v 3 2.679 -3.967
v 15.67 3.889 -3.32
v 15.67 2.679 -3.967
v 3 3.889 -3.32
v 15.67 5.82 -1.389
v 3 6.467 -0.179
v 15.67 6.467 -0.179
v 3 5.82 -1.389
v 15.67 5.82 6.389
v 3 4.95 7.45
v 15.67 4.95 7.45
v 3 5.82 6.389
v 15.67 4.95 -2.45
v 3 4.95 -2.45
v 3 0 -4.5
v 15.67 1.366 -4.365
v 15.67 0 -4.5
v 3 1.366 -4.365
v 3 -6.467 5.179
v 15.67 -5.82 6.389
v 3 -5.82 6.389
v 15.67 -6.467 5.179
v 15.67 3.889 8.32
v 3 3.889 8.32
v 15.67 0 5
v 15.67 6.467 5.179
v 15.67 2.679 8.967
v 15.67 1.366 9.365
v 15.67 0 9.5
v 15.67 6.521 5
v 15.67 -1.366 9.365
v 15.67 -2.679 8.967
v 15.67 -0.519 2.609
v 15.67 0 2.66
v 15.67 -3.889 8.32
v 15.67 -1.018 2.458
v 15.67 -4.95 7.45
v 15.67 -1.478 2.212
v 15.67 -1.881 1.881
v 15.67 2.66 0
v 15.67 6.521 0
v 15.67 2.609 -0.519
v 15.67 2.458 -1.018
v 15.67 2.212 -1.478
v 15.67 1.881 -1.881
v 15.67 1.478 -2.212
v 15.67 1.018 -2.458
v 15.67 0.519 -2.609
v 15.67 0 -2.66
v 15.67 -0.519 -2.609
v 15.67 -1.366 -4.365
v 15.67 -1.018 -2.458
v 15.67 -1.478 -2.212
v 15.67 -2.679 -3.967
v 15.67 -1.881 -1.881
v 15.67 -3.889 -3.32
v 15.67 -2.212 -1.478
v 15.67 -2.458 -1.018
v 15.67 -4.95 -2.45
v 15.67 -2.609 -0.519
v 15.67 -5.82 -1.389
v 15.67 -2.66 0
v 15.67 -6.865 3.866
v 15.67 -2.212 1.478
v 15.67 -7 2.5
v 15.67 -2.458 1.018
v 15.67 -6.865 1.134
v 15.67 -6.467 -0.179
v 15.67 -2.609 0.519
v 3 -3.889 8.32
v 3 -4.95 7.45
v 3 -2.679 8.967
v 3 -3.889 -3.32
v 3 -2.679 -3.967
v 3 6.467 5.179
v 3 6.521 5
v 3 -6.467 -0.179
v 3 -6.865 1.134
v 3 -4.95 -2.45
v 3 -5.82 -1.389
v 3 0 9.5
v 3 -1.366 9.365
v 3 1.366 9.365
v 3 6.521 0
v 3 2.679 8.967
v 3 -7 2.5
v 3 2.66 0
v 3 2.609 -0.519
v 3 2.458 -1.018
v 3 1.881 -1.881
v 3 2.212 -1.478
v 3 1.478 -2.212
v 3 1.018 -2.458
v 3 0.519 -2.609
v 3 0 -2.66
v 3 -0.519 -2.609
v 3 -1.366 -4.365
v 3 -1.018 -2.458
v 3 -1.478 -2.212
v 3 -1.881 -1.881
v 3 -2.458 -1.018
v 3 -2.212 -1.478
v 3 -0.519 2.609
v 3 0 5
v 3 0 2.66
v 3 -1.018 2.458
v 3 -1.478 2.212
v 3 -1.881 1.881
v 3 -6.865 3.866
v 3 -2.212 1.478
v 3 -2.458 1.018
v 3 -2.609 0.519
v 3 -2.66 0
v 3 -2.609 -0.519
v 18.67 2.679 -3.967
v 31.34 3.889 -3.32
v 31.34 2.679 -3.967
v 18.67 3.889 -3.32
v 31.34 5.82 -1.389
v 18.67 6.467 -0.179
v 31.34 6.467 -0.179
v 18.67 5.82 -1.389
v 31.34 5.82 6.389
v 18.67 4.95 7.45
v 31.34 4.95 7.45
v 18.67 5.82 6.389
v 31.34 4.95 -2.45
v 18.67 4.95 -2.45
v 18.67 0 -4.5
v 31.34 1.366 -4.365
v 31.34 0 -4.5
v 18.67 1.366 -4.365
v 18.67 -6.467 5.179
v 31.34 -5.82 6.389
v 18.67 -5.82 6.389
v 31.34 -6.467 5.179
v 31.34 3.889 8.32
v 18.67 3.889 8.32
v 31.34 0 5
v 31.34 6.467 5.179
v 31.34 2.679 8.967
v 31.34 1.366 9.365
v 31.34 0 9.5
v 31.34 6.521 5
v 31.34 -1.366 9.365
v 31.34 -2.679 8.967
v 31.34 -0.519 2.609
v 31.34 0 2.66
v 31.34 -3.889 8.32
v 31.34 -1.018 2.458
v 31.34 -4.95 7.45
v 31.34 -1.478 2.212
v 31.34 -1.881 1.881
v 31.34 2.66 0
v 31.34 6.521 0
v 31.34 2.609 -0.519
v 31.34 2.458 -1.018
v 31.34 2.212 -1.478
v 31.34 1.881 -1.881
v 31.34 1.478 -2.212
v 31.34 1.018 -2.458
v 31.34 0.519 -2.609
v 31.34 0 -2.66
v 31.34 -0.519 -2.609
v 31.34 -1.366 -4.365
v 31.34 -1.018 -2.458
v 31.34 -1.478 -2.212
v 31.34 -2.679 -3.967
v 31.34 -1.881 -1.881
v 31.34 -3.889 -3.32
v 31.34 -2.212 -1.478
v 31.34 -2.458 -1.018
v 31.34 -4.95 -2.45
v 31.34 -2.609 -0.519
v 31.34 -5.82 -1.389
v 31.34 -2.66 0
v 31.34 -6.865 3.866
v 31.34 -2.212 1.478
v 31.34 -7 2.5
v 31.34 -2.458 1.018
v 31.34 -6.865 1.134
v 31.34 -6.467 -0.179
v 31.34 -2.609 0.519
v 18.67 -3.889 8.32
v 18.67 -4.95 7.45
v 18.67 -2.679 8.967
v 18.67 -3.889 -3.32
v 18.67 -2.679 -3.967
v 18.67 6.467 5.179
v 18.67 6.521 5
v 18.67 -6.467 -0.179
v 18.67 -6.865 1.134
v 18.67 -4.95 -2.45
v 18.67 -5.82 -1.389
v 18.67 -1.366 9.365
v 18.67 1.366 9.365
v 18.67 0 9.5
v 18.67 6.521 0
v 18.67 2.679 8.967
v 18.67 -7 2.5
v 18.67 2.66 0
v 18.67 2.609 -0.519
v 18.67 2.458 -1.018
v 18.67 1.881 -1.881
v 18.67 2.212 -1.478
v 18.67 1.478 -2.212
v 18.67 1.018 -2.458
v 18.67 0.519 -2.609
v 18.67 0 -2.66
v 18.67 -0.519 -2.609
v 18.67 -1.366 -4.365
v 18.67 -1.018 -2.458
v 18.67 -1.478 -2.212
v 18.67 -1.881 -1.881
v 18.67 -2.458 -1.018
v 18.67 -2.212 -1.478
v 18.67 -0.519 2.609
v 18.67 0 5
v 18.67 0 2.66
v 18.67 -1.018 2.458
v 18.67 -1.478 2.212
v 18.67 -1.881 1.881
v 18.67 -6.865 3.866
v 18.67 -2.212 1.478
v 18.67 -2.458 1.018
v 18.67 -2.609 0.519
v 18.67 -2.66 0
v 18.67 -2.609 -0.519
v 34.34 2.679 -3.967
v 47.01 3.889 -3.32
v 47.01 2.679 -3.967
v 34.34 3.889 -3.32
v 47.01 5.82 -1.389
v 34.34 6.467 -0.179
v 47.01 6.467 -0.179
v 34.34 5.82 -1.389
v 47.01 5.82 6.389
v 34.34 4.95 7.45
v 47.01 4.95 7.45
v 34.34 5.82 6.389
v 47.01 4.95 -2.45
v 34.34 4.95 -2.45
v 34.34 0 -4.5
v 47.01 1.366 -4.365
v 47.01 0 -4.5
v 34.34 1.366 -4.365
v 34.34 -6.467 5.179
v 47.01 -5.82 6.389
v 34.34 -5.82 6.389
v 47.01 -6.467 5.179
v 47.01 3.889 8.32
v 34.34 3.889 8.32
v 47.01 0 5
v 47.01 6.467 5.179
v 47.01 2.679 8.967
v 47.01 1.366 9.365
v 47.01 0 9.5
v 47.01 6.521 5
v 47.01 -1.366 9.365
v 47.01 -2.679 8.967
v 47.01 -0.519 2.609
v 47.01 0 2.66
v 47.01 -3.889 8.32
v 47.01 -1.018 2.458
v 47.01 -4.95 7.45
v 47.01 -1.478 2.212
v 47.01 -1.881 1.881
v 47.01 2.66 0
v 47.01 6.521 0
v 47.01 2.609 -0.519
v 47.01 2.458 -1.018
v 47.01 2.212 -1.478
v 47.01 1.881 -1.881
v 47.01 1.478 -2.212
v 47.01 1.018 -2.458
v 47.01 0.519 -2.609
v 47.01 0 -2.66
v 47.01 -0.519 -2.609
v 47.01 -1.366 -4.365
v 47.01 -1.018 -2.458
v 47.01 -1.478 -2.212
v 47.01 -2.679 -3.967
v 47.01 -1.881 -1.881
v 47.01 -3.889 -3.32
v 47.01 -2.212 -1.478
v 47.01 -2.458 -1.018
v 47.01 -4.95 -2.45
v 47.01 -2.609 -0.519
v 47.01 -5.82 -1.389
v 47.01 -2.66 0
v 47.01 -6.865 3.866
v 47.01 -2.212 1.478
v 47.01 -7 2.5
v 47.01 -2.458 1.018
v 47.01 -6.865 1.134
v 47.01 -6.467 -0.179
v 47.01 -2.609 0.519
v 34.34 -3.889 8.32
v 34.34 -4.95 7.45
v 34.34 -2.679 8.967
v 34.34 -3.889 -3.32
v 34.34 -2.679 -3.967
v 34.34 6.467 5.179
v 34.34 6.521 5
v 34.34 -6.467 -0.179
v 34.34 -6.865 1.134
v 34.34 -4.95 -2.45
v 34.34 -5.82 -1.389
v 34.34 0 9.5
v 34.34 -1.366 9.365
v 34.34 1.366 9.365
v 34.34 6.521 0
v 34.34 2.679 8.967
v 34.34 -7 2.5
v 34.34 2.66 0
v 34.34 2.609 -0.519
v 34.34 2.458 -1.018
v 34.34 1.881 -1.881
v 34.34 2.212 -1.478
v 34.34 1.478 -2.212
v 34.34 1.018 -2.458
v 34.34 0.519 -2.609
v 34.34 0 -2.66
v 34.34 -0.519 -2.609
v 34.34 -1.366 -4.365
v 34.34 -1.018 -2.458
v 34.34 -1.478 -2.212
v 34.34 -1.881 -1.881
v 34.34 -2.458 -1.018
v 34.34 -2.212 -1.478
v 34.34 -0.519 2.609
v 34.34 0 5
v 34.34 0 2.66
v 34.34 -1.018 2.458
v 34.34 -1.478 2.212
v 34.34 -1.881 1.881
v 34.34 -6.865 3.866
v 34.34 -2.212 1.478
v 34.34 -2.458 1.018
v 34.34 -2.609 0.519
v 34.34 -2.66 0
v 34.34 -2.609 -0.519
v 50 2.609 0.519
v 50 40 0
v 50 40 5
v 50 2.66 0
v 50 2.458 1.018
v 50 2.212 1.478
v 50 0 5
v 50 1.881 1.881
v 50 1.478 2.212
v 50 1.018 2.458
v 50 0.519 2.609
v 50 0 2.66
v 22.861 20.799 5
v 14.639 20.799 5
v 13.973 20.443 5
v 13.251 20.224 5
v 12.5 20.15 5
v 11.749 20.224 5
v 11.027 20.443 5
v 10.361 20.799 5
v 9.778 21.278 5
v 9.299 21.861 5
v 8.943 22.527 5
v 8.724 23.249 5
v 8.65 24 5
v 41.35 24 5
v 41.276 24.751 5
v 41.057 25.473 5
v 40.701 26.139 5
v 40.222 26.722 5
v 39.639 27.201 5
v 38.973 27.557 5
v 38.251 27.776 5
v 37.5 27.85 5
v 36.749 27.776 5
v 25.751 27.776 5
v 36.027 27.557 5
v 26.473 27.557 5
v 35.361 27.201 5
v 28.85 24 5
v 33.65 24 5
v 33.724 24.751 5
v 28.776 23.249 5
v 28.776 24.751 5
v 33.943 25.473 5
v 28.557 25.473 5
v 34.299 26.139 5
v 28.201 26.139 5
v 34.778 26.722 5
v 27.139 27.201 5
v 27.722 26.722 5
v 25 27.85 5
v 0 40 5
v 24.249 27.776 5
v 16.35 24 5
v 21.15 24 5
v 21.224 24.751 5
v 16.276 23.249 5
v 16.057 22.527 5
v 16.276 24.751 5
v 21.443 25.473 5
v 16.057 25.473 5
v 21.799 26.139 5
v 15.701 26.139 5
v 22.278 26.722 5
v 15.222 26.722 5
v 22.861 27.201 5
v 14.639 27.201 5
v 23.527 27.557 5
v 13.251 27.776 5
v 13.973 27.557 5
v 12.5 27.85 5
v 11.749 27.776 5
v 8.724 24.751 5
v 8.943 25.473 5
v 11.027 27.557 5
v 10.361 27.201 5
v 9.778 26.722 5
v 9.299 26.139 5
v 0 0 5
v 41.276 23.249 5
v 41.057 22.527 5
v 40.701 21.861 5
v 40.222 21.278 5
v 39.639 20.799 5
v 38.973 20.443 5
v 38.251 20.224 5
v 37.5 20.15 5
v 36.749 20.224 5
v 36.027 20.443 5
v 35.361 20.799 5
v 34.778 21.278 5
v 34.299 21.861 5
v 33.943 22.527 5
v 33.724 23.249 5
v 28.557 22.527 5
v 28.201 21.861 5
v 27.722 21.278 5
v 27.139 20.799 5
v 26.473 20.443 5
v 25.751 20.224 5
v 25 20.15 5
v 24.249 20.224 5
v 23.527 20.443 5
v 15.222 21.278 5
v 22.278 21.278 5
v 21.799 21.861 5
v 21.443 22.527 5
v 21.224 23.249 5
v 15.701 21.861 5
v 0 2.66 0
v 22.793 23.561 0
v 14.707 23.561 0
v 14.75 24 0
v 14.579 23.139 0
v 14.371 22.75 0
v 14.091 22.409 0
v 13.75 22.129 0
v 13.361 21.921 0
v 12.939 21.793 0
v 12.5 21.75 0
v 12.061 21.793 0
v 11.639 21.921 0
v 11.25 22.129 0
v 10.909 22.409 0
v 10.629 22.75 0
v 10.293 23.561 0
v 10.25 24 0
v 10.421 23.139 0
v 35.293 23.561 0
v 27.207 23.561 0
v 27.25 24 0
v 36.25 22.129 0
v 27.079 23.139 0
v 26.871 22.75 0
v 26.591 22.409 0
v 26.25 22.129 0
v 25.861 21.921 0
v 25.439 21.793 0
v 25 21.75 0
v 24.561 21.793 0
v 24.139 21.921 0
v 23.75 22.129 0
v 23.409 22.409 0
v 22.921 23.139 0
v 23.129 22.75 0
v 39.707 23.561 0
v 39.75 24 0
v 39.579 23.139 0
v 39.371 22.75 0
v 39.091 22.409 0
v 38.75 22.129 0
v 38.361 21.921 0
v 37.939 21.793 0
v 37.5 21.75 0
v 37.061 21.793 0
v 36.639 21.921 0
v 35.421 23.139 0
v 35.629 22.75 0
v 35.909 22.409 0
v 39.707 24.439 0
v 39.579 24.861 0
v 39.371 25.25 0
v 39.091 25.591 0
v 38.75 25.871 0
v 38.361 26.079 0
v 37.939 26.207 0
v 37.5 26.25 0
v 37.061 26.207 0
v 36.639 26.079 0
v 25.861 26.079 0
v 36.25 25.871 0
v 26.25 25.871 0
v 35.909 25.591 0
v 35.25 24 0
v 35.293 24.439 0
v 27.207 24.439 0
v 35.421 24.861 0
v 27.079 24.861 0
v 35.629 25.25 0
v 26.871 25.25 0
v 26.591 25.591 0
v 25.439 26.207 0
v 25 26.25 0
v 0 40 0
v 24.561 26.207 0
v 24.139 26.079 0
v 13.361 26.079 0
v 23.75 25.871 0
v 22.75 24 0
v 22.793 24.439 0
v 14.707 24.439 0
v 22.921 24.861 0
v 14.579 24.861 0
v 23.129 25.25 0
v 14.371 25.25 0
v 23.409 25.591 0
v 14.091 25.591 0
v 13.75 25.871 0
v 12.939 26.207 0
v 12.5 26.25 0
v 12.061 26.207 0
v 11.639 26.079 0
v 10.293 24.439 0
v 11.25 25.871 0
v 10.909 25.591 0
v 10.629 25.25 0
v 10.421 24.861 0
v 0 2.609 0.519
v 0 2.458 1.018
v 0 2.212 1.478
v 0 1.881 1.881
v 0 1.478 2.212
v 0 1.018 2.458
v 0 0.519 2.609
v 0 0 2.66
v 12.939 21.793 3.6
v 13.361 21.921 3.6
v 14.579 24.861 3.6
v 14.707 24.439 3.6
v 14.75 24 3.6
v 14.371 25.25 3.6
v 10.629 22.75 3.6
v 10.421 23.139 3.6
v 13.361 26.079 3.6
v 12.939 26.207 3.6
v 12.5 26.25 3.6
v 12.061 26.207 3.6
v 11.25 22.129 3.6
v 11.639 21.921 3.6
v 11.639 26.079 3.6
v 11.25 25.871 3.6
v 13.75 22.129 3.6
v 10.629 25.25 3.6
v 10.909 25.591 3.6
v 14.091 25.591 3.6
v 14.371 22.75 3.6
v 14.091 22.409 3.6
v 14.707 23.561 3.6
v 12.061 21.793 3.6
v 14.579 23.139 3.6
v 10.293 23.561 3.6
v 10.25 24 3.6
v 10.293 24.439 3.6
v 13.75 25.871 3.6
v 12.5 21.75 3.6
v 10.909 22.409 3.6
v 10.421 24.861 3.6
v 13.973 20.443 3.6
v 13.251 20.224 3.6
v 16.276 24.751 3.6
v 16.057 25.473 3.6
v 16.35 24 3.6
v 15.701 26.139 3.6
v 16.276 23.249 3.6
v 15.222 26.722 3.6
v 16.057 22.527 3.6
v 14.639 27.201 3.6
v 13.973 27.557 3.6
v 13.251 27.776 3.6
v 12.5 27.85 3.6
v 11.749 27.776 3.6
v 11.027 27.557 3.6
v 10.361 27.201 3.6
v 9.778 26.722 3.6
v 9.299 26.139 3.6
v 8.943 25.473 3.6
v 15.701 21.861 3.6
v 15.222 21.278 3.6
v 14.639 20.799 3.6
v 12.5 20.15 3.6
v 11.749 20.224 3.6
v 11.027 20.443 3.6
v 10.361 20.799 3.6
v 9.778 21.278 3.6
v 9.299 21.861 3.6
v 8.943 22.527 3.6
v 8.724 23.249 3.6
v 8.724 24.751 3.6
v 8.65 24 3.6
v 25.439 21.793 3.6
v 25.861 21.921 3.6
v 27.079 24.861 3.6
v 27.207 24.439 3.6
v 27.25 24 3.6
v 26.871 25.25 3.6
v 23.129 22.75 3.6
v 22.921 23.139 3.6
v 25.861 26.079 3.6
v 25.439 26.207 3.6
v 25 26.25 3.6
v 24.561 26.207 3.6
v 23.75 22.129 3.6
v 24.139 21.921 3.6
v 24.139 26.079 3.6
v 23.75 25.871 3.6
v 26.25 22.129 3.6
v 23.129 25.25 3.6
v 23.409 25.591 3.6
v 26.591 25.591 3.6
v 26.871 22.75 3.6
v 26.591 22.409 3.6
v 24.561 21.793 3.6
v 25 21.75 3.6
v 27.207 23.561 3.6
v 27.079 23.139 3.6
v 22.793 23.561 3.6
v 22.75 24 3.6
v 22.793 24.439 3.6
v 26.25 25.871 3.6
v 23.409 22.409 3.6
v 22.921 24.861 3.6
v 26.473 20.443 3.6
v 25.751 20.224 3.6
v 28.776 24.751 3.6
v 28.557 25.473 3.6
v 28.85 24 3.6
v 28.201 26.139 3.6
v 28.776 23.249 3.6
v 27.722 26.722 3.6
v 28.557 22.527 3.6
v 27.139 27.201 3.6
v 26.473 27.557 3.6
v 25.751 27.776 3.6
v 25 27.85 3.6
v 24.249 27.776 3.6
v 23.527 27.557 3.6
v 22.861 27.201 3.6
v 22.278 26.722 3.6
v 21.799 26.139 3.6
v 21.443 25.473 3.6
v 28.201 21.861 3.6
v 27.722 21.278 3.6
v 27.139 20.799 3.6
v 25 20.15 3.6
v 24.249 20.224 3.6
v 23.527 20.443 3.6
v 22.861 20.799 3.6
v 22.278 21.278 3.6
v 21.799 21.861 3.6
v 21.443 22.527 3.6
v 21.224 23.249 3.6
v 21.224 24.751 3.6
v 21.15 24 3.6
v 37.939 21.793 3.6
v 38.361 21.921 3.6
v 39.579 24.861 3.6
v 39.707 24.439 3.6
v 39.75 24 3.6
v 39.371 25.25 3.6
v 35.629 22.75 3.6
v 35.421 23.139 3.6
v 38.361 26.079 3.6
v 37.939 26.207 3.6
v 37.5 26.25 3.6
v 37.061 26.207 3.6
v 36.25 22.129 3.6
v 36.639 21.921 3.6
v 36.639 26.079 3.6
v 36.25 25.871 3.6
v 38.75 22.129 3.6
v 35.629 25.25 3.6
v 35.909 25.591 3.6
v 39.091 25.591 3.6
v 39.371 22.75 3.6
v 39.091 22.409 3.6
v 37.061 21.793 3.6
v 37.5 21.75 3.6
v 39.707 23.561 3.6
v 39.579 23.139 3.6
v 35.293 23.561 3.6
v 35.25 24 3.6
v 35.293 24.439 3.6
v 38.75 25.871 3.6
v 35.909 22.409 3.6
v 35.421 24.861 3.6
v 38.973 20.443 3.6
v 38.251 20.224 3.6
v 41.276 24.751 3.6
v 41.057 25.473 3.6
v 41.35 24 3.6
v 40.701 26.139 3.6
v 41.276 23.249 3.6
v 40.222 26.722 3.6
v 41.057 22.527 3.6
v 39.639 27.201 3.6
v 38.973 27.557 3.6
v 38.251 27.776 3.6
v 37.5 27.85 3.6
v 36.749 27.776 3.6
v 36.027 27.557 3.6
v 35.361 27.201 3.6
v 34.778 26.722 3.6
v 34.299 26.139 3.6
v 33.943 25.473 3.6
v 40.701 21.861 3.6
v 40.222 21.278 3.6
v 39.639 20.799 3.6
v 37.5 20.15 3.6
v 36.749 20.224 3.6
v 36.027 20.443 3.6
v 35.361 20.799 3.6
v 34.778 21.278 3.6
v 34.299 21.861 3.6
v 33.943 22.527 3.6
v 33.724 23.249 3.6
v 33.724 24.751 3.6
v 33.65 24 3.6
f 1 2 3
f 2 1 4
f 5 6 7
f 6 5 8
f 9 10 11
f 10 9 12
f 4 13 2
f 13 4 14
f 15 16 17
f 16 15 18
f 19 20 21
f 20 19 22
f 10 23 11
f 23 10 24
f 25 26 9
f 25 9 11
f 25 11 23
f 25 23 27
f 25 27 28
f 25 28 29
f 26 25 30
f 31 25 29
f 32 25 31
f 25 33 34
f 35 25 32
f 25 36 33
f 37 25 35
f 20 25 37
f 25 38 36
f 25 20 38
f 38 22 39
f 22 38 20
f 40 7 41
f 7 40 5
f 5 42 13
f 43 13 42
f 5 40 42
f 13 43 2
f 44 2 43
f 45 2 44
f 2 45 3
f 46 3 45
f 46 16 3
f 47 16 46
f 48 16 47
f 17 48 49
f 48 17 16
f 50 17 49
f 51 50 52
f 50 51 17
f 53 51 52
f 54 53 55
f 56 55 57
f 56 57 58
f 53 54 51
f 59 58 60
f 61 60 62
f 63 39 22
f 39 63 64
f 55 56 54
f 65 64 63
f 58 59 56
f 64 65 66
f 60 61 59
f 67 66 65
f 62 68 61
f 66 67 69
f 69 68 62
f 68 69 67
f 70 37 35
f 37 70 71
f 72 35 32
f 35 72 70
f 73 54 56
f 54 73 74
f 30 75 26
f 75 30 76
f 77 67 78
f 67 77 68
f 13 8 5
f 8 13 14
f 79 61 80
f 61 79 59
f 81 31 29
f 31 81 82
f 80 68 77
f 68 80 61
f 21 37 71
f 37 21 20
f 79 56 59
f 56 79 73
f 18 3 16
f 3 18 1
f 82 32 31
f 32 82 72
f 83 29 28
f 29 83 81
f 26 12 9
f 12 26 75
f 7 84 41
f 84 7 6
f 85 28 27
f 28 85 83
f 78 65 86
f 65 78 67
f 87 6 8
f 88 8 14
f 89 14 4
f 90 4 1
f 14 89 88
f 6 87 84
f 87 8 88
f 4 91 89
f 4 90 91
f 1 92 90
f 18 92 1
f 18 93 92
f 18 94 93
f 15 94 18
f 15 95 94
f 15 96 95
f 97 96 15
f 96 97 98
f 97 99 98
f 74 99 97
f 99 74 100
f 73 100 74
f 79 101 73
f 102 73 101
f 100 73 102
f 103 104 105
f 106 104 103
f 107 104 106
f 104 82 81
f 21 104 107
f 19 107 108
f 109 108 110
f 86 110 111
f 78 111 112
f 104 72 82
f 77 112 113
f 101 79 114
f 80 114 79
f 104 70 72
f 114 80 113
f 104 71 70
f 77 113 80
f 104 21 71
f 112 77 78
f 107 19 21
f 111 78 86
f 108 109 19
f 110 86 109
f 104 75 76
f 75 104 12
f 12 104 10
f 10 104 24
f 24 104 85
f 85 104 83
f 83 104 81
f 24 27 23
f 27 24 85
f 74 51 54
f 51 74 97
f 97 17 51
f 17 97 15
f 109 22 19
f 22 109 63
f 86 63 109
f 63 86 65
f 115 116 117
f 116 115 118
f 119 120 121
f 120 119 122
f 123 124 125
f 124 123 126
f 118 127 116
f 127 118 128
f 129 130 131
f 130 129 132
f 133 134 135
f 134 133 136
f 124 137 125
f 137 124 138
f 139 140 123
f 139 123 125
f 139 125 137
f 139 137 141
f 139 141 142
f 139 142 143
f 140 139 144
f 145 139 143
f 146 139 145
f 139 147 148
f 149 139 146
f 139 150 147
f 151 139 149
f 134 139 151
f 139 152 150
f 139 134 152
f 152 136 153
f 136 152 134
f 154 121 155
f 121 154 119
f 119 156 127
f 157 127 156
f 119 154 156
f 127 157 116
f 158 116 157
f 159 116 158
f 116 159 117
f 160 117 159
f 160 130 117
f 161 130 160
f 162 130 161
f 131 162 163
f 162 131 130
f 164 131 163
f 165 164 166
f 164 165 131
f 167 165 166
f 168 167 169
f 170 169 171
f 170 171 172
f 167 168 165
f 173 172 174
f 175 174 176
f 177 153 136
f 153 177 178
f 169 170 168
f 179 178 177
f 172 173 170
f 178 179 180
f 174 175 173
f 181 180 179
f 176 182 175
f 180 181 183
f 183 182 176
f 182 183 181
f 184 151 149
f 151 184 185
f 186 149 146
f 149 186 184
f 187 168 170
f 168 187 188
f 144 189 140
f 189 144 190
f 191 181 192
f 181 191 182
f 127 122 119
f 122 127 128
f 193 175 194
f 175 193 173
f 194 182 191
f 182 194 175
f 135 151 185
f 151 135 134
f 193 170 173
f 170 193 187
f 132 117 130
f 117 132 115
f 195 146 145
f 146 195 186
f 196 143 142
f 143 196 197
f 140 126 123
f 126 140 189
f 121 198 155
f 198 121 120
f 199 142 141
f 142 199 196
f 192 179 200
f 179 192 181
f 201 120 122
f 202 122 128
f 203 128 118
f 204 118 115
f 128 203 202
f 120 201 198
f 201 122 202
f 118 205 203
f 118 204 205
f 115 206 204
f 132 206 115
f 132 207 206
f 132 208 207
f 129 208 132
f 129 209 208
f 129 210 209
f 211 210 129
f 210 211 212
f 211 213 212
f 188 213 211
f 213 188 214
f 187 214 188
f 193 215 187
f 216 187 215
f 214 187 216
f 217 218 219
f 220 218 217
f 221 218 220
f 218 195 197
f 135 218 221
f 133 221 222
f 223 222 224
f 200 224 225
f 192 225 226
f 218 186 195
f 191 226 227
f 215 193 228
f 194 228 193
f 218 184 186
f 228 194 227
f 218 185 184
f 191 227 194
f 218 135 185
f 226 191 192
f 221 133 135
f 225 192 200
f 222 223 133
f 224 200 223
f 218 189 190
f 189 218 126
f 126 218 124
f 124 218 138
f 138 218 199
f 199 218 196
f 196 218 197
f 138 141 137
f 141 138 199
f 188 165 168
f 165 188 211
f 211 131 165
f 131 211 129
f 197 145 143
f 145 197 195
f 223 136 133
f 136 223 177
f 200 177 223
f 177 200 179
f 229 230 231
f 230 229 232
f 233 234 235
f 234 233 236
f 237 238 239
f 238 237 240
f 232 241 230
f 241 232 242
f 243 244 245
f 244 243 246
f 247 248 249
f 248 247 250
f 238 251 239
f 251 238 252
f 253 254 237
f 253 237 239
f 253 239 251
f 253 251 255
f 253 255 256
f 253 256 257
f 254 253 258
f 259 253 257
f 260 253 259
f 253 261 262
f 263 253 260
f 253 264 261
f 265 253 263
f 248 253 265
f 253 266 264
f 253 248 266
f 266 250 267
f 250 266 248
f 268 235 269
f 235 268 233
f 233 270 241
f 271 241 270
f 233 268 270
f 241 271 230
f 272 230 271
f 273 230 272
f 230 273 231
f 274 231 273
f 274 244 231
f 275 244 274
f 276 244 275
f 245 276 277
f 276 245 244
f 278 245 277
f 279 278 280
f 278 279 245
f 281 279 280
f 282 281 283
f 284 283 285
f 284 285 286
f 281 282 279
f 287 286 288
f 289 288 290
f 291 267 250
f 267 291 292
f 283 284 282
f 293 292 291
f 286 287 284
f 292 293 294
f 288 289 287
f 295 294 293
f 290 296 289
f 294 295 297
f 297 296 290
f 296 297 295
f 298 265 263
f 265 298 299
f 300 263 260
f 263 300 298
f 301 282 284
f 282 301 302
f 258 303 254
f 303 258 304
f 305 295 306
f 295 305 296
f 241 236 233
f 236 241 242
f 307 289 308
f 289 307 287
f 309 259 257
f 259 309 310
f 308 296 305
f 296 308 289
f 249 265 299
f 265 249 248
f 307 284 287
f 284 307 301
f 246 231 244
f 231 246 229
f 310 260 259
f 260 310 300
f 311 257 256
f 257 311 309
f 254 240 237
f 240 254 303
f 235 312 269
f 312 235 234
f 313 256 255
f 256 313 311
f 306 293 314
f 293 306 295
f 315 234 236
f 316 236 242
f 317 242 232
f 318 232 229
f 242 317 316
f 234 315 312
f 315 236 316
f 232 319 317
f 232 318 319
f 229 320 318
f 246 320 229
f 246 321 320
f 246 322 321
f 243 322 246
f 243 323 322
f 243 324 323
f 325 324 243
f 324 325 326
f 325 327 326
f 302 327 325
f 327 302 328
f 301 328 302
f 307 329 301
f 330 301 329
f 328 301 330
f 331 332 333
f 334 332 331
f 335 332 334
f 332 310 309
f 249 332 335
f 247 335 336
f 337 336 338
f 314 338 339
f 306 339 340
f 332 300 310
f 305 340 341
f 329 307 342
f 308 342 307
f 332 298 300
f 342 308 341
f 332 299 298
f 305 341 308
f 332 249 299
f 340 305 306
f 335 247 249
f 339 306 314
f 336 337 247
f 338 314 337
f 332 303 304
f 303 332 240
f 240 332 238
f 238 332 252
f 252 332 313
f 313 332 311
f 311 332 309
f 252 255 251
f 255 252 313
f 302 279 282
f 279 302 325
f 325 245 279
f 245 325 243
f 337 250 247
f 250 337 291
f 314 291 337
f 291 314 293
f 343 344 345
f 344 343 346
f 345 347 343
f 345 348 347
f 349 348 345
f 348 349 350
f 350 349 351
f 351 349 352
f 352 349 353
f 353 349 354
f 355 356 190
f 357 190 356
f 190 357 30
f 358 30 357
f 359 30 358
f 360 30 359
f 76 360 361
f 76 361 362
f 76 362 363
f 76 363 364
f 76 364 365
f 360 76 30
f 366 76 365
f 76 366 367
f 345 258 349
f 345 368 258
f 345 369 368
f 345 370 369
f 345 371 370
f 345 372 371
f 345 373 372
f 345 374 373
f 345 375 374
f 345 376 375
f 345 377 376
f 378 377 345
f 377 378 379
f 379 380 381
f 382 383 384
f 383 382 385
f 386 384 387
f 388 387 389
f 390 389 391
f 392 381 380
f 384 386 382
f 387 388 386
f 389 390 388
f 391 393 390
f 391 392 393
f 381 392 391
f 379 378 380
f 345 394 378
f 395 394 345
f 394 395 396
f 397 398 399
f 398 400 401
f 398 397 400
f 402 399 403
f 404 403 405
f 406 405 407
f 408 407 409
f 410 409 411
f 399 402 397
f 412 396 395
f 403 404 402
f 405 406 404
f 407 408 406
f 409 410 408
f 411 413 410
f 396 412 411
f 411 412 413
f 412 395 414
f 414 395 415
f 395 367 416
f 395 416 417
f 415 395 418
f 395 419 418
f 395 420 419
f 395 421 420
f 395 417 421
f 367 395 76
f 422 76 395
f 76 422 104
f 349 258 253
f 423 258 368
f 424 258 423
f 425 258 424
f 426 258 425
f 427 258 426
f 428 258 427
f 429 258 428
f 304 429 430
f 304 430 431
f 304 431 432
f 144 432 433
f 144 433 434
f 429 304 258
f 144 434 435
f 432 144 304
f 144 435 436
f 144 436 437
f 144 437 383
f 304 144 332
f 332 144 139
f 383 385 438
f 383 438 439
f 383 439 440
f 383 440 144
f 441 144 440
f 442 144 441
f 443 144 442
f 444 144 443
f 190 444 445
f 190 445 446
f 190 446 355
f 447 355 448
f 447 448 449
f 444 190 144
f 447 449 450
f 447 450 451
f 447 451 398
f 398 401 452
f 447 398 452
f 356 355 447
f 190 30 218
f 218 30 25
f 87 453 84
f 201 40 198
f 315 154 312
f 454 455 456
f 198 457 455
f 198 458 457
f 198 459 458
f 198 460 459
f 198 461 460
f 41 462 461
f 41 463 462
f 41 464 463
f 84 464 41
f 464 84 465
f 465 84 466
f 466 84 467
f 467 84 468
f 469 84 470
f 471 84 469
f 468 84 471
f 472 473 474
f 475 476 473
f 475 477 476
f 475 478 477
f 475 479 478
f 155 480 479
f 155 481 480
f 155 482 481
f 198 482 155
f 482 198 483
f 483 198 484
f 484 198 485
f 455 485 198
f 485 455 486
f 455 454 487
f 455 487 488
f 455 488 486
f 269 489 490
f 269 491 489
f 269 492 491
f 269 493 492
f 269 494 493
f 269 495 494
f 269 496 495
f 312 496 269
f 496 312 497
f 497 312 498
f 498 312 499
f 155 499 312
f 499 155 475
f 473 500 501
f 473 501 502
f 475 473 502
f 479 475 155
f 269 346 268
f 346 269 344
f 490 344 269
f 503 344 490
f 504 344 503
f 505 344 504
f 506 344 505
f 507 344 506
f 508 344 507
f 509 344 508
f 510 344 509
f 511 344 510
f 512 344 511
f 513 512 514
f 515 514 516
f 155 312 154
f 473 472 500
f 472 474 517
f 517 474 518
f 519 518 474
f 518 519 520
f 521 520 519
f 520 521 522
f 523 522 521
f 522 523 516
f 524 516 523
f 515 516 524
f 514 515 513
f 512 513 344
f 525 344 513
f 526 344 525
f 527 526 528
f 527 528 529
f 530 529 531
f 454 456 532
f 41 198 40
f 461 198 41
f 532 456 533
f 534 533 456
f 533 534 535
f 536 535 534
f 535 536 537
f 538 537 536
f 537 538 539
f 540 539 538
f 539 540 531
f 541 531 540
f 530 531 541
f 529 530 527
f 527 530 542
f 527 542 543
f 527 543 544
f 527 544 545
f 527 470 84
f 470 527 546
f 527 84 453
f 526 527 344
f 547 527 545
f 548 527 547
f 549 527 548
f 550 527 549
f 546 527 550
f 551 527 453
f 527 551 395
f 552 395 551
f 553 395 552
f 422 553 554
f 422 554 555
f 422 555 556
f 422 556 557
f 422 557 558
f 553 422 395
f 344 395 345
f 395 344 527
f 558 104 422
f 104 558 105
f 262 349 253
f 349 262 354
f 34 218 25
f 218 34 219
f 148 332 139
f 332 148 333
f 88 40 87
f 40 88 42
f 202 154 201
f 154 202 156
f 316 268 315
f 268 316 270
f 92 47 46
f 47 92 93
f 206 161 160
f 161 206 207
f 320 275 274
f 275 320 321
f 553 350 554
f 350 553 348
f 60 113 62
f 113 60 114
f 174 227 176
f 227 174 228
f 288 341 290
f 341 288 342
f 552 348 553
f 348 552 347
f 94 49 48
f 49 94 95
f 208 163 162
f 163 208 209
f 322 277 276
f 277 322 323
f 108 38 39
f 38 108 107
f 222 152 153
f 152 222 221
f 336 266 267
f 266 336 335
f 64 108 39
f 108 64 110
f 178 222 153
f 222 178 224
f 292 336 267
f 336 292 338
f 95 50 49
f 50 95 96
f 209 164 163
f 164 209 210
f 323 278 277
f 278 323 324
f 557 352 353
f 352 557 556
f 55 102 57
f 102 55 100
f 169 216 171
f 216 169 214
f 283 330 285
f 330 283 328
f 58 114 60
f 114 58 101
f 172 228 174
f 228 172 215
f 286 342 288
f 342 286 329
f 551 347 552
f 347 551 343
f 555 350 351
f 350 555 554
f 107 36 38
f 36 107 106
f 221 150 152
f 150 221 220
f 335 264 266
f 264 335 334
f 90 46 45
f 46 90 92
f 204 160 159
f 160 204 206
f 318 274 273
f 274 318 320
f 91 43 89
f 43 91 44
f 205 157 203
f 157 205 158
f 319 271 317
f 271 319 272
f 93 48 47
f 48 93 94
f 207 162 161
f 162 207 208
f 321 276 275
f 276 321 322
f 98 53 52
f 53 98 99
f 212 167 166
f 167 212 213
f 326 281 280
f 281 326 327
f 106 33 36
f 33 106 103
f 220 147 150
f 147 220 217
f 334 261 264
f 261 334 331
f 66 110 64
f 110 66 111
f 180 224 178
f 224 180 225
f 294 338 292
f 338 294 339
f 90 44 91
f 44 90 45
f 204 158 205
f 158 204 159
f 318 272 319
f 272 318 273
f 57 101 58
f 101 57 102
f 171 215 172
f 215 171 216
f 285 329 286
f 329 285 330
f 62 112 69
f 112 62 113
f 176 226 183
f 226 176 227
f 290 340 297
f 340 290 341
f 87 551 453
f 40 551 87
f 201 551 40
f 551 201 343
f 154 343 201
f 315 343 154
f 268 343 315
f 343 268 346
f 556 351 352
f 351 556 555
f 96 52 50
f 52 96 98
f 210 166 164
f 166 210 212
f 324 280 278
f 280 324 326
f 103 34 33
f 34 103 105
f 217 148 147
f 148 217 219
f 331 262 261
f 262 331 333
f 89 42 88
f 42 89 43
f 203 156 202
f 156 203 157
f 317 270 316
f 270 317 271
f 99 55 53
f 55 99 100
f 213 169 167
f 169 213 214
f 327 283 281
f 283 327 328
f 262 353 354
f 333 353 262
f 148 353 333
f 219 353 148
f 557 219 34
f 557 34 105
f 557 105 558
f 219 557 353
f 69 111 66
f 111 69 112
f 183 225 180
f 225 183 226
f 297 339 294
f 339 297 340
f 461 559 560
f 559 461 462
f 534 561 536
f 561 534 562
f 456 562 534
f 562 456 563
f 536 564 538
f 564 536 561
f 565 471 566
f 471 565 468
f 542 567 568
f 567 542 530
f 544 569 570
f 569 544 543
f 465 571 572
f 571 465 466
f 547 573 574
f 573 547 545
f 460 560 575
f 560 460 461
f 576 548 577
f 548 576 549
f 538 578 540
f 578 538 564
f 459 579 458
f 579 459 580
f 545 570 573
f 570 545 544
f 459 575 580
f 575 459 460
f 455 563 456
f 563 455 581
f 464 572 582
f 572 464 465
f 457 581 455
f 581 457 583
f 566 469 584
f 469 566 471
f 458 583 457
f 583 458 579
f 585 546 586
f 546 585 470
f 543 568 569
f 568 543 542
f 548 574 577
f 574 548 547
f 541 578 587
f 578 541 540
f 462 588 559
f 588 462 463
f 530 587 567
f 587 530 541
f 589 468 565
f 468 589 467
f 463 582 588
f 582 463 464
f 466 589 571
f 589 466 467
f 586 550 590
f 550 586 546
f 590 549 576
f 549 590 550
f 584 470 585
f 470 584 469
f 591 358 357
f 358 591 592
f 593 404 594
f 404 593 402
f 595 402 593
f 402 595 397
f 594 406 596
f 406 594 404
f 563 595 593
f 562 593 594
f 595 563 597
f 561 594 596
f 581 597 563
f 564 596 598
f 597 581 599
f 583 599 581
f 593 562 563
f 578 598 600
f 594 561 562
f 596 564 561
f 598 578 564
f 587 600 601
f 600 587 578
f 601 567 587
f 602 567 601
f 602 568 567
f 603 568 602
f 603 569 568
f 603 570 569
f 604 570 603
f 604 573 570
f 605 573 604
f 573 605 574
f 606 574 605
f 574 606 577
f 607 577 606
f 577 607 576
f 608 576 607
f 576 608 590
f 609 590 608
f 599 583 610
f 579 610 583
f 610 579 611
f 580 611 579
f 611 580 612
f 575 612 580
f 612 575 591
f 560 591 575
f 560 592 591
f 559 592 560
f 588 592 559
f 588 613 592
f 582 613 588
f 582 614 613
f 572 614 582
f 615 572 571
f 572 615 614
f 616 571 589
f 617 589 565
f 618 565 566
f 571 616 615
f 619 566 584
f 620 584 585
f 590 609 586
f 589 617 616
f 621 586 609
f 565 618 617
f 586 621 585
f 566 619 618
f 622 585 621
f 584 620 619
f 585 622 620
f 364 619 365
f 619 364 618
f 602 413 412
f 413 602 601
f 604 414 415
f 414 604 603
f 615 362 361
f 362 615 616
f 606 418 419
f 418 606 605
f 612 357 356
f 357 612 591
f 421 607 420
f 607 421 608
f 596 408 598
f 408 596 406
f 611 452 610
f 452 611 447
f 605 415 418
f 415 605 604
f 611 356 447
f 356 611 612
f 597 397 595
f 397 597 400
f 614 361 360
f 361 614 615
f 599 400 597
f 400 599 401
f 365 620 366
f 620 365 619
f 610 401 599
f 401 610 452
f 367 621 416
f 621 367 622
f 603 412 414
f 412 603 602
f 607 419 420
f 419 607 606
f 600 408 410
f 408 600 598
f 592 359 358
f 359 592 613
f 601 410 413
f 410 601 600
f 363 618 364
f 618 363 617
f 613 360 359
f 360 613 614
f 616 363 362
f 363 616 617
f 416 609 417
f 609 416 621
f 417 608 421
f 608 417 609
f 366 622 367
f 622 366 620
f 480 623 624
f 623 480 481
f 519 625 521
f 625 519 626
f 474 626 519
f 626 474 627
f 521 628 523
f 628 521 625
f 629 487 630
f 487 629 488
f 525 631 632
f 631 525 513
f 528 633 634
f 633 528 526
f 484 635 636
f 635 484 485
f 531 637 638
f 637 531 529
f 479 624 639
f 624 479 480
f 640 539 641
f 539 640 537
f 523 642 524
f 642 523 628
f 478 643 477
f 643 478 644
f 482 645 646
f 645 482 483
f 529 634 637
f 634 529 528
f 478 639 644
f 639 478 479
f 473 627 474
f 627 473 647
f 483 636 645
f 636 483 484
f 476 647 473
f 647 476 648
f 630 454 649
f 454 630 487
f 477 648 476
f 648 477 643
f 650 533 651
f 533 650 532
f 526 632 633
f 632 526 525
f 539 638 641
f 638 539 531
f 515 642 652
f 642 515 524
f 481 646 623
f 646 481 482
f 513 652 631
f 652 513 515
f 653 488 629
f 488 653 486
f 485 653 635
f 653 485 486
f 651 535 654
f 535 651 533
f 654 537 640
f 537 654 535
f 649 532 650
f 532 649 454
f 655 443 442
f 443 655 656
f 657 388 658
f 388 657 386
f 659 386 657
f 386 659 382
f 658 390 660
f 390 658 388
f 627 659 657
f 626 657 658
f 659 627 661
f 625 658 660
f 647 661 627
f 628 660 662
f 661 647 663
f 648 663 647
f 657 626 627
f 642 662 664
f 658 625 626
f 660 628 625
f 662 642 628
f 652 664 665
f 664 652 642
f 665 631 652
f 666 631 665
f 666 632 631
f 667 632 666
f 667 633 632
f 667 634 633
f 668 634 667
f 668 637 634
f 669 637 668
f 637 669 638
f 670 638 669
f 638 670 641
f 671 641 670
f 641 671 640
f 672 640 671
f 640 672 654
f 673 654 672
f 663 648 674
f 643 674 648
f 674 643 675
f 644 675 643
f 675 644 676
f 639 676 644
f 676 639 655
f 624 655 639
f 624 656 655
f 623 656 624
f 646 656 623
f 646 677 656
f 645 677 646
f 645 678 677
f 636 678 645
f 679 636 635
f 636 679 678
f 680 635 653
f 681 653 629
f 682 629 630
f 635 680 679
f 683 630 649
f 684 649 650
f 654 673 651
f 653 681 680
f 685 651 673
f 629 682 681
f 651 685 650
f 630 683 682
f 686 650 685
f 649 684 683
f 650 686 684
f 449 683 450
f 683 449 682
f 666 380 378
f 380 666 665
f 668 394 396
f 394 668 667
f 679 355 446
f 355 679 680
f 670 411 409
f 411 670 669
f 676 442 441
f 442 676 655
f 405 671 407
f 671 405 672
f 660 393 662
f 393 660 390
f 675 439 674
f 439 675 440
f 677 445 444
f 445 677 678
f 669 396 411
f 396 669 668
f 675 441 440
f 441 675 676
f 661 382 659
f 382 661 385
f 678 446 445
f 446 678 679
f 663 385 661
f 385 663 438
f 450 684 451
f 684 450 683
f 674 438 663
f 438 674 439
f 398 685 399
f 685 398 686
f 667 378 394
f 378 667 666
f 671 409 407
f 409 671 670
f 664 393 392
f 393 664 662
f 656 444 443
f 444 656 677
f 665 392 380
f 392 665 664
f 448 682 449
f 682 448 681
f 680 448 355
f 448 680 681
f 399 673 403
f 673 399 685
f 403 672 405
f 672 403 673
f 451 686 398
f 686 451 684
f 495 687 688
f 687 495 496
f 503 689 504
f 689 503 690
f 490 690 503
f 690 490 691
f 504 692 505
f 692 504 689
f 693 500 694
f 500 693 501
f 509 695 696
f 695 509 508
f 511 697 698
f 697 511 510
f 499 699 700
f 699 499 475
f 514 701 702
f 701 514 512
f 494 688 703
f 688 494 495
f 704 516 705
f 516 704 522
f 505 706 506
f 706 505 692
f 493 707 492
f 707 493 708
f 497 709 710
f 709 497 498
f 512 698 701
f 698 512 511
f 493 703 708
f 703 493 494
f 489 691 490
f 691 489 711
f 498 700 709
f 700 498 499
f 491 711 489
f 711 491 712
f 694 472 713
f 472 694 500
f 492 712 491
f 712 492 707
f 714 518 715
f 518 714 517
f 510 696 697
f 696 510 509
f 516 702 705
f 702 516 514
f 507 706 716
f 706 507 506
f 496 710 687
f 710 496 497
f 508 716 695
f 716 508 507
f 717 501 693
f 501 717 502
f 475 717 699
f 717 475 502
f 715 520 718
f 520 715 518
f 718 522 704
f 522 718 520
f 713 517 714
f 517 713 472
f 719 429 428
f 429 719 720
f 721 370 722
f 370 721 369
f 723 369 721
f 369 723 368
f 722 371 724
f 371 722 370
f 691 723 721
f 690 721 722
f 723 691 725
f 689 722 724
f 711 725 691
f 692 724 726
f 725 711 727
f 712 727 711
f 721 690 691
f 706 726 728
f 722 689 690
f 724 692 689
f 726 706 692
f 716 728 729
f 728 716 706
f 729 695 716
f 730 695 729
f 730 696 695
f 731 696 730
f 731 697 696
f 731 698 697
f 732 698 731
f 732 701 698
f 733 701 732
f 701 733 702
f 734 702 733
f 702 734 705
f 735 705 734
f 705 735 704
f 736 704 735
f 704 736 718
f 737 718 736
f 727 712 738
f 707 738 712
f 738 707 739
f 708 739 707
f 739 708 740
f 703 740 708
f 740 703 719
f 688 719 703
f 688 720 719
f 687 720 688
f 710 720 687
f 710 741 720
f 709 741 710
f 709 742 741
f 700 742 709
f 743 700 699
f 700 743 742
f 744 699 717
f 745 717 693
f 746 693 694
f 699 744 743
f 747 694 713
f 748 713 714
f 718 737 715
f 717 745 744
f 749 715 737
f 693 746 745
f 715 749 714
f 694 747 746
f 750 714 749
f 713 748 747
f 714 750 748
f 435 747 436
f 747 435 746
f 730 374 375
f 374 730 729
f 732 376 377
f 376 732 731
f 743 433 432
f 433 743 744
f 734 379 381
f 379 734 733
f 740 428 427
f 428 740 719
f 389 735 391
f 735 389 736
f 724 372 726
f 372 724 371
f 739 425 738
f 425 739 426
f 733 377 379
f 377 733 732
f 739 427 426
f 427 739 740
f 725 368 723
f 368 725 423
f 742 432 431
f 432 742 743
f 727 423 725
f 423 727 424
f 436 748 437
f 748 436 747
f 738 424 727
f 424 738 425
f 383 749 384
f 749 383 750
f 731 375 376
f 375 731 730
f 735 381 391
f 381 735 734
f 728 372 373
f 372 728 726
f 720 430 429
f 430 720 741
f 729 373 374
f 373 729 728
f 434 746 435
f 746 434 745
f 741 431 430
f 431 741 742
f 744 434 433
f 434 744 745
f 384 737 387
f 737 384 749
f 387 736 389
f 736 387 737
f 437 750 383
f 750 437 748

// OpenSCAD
$fn = 32;

// ----------------------------------------------------------------------
// Hinge leaf: 50 x 47 x 14 mm
// ----------------------------------------------------------------------

// --- parameters (mm) ---
leaf_len = 50;            // leaf length, X
leaf_w = 40;              // leaf width, Y
leaf_t = 5;               // leaf thickness
knuckle_d = 14;           // knuckle diameter
knuckle_w = 12.67;        // knuckle width
knuckle_n = 3;            // number of knuckles
pin_d = 5.32;             // pin bore
gap = 3;                  // gap between the knuckles
screw_d = 4.5;            // screw clearance
cs_d = 7.7;               // countersink diameter
cs_h = 1.4;               // countersink depth

module leaf() {
  cube([leaf_len, leaf_w, leaf_t]);
}

module knuckles() {
  /* barrels sit on the leaf edge, the pin axis at half the leaf thickness */
  for (i = [0 : knuckle_n - 1])
    translate([gap + i * (knuckle_w + gap), 0, leaf_t * 0.5])
      rotate([0, 90, 0]) cylinder(h = knuckle_w, d = knuckle_d);
}

difference() {
  union() {
    leaf();
    knuckles();
  }
  rotate([0, 90, 0]) translate([0, 0, -1])
    cylinder(h = leaf_len + 2, d = pin_d);
  translate([12.5, leaf_w * 0.6, -1]) cylinder(h = leaf_t + 2, d = screw_d);
  translate([12.5, leaf_w * 0.6, leaf_t - cs_h]) cylinder(h = cs_h + 0.5, d = cs_d);
  translate([25, leaf_w * 0.6, -1]) cylinder(h = leaf_t + 2, d = screw_d);
  translate([25, leaf_w * 0.6, leaf_t - cs_h]) cylinder(h = cs_h + 0.5, d = cs_d);
  translate([37.5, leaf_w * 0.6, -1]) cylinder(h = leaf_t + 2, d = screw_d);
  translate([37.5, leaf_w * 0.6, leaf_t - cs_h]) cylinder(h = cs_h + 0.5, d = cs_d);
}
